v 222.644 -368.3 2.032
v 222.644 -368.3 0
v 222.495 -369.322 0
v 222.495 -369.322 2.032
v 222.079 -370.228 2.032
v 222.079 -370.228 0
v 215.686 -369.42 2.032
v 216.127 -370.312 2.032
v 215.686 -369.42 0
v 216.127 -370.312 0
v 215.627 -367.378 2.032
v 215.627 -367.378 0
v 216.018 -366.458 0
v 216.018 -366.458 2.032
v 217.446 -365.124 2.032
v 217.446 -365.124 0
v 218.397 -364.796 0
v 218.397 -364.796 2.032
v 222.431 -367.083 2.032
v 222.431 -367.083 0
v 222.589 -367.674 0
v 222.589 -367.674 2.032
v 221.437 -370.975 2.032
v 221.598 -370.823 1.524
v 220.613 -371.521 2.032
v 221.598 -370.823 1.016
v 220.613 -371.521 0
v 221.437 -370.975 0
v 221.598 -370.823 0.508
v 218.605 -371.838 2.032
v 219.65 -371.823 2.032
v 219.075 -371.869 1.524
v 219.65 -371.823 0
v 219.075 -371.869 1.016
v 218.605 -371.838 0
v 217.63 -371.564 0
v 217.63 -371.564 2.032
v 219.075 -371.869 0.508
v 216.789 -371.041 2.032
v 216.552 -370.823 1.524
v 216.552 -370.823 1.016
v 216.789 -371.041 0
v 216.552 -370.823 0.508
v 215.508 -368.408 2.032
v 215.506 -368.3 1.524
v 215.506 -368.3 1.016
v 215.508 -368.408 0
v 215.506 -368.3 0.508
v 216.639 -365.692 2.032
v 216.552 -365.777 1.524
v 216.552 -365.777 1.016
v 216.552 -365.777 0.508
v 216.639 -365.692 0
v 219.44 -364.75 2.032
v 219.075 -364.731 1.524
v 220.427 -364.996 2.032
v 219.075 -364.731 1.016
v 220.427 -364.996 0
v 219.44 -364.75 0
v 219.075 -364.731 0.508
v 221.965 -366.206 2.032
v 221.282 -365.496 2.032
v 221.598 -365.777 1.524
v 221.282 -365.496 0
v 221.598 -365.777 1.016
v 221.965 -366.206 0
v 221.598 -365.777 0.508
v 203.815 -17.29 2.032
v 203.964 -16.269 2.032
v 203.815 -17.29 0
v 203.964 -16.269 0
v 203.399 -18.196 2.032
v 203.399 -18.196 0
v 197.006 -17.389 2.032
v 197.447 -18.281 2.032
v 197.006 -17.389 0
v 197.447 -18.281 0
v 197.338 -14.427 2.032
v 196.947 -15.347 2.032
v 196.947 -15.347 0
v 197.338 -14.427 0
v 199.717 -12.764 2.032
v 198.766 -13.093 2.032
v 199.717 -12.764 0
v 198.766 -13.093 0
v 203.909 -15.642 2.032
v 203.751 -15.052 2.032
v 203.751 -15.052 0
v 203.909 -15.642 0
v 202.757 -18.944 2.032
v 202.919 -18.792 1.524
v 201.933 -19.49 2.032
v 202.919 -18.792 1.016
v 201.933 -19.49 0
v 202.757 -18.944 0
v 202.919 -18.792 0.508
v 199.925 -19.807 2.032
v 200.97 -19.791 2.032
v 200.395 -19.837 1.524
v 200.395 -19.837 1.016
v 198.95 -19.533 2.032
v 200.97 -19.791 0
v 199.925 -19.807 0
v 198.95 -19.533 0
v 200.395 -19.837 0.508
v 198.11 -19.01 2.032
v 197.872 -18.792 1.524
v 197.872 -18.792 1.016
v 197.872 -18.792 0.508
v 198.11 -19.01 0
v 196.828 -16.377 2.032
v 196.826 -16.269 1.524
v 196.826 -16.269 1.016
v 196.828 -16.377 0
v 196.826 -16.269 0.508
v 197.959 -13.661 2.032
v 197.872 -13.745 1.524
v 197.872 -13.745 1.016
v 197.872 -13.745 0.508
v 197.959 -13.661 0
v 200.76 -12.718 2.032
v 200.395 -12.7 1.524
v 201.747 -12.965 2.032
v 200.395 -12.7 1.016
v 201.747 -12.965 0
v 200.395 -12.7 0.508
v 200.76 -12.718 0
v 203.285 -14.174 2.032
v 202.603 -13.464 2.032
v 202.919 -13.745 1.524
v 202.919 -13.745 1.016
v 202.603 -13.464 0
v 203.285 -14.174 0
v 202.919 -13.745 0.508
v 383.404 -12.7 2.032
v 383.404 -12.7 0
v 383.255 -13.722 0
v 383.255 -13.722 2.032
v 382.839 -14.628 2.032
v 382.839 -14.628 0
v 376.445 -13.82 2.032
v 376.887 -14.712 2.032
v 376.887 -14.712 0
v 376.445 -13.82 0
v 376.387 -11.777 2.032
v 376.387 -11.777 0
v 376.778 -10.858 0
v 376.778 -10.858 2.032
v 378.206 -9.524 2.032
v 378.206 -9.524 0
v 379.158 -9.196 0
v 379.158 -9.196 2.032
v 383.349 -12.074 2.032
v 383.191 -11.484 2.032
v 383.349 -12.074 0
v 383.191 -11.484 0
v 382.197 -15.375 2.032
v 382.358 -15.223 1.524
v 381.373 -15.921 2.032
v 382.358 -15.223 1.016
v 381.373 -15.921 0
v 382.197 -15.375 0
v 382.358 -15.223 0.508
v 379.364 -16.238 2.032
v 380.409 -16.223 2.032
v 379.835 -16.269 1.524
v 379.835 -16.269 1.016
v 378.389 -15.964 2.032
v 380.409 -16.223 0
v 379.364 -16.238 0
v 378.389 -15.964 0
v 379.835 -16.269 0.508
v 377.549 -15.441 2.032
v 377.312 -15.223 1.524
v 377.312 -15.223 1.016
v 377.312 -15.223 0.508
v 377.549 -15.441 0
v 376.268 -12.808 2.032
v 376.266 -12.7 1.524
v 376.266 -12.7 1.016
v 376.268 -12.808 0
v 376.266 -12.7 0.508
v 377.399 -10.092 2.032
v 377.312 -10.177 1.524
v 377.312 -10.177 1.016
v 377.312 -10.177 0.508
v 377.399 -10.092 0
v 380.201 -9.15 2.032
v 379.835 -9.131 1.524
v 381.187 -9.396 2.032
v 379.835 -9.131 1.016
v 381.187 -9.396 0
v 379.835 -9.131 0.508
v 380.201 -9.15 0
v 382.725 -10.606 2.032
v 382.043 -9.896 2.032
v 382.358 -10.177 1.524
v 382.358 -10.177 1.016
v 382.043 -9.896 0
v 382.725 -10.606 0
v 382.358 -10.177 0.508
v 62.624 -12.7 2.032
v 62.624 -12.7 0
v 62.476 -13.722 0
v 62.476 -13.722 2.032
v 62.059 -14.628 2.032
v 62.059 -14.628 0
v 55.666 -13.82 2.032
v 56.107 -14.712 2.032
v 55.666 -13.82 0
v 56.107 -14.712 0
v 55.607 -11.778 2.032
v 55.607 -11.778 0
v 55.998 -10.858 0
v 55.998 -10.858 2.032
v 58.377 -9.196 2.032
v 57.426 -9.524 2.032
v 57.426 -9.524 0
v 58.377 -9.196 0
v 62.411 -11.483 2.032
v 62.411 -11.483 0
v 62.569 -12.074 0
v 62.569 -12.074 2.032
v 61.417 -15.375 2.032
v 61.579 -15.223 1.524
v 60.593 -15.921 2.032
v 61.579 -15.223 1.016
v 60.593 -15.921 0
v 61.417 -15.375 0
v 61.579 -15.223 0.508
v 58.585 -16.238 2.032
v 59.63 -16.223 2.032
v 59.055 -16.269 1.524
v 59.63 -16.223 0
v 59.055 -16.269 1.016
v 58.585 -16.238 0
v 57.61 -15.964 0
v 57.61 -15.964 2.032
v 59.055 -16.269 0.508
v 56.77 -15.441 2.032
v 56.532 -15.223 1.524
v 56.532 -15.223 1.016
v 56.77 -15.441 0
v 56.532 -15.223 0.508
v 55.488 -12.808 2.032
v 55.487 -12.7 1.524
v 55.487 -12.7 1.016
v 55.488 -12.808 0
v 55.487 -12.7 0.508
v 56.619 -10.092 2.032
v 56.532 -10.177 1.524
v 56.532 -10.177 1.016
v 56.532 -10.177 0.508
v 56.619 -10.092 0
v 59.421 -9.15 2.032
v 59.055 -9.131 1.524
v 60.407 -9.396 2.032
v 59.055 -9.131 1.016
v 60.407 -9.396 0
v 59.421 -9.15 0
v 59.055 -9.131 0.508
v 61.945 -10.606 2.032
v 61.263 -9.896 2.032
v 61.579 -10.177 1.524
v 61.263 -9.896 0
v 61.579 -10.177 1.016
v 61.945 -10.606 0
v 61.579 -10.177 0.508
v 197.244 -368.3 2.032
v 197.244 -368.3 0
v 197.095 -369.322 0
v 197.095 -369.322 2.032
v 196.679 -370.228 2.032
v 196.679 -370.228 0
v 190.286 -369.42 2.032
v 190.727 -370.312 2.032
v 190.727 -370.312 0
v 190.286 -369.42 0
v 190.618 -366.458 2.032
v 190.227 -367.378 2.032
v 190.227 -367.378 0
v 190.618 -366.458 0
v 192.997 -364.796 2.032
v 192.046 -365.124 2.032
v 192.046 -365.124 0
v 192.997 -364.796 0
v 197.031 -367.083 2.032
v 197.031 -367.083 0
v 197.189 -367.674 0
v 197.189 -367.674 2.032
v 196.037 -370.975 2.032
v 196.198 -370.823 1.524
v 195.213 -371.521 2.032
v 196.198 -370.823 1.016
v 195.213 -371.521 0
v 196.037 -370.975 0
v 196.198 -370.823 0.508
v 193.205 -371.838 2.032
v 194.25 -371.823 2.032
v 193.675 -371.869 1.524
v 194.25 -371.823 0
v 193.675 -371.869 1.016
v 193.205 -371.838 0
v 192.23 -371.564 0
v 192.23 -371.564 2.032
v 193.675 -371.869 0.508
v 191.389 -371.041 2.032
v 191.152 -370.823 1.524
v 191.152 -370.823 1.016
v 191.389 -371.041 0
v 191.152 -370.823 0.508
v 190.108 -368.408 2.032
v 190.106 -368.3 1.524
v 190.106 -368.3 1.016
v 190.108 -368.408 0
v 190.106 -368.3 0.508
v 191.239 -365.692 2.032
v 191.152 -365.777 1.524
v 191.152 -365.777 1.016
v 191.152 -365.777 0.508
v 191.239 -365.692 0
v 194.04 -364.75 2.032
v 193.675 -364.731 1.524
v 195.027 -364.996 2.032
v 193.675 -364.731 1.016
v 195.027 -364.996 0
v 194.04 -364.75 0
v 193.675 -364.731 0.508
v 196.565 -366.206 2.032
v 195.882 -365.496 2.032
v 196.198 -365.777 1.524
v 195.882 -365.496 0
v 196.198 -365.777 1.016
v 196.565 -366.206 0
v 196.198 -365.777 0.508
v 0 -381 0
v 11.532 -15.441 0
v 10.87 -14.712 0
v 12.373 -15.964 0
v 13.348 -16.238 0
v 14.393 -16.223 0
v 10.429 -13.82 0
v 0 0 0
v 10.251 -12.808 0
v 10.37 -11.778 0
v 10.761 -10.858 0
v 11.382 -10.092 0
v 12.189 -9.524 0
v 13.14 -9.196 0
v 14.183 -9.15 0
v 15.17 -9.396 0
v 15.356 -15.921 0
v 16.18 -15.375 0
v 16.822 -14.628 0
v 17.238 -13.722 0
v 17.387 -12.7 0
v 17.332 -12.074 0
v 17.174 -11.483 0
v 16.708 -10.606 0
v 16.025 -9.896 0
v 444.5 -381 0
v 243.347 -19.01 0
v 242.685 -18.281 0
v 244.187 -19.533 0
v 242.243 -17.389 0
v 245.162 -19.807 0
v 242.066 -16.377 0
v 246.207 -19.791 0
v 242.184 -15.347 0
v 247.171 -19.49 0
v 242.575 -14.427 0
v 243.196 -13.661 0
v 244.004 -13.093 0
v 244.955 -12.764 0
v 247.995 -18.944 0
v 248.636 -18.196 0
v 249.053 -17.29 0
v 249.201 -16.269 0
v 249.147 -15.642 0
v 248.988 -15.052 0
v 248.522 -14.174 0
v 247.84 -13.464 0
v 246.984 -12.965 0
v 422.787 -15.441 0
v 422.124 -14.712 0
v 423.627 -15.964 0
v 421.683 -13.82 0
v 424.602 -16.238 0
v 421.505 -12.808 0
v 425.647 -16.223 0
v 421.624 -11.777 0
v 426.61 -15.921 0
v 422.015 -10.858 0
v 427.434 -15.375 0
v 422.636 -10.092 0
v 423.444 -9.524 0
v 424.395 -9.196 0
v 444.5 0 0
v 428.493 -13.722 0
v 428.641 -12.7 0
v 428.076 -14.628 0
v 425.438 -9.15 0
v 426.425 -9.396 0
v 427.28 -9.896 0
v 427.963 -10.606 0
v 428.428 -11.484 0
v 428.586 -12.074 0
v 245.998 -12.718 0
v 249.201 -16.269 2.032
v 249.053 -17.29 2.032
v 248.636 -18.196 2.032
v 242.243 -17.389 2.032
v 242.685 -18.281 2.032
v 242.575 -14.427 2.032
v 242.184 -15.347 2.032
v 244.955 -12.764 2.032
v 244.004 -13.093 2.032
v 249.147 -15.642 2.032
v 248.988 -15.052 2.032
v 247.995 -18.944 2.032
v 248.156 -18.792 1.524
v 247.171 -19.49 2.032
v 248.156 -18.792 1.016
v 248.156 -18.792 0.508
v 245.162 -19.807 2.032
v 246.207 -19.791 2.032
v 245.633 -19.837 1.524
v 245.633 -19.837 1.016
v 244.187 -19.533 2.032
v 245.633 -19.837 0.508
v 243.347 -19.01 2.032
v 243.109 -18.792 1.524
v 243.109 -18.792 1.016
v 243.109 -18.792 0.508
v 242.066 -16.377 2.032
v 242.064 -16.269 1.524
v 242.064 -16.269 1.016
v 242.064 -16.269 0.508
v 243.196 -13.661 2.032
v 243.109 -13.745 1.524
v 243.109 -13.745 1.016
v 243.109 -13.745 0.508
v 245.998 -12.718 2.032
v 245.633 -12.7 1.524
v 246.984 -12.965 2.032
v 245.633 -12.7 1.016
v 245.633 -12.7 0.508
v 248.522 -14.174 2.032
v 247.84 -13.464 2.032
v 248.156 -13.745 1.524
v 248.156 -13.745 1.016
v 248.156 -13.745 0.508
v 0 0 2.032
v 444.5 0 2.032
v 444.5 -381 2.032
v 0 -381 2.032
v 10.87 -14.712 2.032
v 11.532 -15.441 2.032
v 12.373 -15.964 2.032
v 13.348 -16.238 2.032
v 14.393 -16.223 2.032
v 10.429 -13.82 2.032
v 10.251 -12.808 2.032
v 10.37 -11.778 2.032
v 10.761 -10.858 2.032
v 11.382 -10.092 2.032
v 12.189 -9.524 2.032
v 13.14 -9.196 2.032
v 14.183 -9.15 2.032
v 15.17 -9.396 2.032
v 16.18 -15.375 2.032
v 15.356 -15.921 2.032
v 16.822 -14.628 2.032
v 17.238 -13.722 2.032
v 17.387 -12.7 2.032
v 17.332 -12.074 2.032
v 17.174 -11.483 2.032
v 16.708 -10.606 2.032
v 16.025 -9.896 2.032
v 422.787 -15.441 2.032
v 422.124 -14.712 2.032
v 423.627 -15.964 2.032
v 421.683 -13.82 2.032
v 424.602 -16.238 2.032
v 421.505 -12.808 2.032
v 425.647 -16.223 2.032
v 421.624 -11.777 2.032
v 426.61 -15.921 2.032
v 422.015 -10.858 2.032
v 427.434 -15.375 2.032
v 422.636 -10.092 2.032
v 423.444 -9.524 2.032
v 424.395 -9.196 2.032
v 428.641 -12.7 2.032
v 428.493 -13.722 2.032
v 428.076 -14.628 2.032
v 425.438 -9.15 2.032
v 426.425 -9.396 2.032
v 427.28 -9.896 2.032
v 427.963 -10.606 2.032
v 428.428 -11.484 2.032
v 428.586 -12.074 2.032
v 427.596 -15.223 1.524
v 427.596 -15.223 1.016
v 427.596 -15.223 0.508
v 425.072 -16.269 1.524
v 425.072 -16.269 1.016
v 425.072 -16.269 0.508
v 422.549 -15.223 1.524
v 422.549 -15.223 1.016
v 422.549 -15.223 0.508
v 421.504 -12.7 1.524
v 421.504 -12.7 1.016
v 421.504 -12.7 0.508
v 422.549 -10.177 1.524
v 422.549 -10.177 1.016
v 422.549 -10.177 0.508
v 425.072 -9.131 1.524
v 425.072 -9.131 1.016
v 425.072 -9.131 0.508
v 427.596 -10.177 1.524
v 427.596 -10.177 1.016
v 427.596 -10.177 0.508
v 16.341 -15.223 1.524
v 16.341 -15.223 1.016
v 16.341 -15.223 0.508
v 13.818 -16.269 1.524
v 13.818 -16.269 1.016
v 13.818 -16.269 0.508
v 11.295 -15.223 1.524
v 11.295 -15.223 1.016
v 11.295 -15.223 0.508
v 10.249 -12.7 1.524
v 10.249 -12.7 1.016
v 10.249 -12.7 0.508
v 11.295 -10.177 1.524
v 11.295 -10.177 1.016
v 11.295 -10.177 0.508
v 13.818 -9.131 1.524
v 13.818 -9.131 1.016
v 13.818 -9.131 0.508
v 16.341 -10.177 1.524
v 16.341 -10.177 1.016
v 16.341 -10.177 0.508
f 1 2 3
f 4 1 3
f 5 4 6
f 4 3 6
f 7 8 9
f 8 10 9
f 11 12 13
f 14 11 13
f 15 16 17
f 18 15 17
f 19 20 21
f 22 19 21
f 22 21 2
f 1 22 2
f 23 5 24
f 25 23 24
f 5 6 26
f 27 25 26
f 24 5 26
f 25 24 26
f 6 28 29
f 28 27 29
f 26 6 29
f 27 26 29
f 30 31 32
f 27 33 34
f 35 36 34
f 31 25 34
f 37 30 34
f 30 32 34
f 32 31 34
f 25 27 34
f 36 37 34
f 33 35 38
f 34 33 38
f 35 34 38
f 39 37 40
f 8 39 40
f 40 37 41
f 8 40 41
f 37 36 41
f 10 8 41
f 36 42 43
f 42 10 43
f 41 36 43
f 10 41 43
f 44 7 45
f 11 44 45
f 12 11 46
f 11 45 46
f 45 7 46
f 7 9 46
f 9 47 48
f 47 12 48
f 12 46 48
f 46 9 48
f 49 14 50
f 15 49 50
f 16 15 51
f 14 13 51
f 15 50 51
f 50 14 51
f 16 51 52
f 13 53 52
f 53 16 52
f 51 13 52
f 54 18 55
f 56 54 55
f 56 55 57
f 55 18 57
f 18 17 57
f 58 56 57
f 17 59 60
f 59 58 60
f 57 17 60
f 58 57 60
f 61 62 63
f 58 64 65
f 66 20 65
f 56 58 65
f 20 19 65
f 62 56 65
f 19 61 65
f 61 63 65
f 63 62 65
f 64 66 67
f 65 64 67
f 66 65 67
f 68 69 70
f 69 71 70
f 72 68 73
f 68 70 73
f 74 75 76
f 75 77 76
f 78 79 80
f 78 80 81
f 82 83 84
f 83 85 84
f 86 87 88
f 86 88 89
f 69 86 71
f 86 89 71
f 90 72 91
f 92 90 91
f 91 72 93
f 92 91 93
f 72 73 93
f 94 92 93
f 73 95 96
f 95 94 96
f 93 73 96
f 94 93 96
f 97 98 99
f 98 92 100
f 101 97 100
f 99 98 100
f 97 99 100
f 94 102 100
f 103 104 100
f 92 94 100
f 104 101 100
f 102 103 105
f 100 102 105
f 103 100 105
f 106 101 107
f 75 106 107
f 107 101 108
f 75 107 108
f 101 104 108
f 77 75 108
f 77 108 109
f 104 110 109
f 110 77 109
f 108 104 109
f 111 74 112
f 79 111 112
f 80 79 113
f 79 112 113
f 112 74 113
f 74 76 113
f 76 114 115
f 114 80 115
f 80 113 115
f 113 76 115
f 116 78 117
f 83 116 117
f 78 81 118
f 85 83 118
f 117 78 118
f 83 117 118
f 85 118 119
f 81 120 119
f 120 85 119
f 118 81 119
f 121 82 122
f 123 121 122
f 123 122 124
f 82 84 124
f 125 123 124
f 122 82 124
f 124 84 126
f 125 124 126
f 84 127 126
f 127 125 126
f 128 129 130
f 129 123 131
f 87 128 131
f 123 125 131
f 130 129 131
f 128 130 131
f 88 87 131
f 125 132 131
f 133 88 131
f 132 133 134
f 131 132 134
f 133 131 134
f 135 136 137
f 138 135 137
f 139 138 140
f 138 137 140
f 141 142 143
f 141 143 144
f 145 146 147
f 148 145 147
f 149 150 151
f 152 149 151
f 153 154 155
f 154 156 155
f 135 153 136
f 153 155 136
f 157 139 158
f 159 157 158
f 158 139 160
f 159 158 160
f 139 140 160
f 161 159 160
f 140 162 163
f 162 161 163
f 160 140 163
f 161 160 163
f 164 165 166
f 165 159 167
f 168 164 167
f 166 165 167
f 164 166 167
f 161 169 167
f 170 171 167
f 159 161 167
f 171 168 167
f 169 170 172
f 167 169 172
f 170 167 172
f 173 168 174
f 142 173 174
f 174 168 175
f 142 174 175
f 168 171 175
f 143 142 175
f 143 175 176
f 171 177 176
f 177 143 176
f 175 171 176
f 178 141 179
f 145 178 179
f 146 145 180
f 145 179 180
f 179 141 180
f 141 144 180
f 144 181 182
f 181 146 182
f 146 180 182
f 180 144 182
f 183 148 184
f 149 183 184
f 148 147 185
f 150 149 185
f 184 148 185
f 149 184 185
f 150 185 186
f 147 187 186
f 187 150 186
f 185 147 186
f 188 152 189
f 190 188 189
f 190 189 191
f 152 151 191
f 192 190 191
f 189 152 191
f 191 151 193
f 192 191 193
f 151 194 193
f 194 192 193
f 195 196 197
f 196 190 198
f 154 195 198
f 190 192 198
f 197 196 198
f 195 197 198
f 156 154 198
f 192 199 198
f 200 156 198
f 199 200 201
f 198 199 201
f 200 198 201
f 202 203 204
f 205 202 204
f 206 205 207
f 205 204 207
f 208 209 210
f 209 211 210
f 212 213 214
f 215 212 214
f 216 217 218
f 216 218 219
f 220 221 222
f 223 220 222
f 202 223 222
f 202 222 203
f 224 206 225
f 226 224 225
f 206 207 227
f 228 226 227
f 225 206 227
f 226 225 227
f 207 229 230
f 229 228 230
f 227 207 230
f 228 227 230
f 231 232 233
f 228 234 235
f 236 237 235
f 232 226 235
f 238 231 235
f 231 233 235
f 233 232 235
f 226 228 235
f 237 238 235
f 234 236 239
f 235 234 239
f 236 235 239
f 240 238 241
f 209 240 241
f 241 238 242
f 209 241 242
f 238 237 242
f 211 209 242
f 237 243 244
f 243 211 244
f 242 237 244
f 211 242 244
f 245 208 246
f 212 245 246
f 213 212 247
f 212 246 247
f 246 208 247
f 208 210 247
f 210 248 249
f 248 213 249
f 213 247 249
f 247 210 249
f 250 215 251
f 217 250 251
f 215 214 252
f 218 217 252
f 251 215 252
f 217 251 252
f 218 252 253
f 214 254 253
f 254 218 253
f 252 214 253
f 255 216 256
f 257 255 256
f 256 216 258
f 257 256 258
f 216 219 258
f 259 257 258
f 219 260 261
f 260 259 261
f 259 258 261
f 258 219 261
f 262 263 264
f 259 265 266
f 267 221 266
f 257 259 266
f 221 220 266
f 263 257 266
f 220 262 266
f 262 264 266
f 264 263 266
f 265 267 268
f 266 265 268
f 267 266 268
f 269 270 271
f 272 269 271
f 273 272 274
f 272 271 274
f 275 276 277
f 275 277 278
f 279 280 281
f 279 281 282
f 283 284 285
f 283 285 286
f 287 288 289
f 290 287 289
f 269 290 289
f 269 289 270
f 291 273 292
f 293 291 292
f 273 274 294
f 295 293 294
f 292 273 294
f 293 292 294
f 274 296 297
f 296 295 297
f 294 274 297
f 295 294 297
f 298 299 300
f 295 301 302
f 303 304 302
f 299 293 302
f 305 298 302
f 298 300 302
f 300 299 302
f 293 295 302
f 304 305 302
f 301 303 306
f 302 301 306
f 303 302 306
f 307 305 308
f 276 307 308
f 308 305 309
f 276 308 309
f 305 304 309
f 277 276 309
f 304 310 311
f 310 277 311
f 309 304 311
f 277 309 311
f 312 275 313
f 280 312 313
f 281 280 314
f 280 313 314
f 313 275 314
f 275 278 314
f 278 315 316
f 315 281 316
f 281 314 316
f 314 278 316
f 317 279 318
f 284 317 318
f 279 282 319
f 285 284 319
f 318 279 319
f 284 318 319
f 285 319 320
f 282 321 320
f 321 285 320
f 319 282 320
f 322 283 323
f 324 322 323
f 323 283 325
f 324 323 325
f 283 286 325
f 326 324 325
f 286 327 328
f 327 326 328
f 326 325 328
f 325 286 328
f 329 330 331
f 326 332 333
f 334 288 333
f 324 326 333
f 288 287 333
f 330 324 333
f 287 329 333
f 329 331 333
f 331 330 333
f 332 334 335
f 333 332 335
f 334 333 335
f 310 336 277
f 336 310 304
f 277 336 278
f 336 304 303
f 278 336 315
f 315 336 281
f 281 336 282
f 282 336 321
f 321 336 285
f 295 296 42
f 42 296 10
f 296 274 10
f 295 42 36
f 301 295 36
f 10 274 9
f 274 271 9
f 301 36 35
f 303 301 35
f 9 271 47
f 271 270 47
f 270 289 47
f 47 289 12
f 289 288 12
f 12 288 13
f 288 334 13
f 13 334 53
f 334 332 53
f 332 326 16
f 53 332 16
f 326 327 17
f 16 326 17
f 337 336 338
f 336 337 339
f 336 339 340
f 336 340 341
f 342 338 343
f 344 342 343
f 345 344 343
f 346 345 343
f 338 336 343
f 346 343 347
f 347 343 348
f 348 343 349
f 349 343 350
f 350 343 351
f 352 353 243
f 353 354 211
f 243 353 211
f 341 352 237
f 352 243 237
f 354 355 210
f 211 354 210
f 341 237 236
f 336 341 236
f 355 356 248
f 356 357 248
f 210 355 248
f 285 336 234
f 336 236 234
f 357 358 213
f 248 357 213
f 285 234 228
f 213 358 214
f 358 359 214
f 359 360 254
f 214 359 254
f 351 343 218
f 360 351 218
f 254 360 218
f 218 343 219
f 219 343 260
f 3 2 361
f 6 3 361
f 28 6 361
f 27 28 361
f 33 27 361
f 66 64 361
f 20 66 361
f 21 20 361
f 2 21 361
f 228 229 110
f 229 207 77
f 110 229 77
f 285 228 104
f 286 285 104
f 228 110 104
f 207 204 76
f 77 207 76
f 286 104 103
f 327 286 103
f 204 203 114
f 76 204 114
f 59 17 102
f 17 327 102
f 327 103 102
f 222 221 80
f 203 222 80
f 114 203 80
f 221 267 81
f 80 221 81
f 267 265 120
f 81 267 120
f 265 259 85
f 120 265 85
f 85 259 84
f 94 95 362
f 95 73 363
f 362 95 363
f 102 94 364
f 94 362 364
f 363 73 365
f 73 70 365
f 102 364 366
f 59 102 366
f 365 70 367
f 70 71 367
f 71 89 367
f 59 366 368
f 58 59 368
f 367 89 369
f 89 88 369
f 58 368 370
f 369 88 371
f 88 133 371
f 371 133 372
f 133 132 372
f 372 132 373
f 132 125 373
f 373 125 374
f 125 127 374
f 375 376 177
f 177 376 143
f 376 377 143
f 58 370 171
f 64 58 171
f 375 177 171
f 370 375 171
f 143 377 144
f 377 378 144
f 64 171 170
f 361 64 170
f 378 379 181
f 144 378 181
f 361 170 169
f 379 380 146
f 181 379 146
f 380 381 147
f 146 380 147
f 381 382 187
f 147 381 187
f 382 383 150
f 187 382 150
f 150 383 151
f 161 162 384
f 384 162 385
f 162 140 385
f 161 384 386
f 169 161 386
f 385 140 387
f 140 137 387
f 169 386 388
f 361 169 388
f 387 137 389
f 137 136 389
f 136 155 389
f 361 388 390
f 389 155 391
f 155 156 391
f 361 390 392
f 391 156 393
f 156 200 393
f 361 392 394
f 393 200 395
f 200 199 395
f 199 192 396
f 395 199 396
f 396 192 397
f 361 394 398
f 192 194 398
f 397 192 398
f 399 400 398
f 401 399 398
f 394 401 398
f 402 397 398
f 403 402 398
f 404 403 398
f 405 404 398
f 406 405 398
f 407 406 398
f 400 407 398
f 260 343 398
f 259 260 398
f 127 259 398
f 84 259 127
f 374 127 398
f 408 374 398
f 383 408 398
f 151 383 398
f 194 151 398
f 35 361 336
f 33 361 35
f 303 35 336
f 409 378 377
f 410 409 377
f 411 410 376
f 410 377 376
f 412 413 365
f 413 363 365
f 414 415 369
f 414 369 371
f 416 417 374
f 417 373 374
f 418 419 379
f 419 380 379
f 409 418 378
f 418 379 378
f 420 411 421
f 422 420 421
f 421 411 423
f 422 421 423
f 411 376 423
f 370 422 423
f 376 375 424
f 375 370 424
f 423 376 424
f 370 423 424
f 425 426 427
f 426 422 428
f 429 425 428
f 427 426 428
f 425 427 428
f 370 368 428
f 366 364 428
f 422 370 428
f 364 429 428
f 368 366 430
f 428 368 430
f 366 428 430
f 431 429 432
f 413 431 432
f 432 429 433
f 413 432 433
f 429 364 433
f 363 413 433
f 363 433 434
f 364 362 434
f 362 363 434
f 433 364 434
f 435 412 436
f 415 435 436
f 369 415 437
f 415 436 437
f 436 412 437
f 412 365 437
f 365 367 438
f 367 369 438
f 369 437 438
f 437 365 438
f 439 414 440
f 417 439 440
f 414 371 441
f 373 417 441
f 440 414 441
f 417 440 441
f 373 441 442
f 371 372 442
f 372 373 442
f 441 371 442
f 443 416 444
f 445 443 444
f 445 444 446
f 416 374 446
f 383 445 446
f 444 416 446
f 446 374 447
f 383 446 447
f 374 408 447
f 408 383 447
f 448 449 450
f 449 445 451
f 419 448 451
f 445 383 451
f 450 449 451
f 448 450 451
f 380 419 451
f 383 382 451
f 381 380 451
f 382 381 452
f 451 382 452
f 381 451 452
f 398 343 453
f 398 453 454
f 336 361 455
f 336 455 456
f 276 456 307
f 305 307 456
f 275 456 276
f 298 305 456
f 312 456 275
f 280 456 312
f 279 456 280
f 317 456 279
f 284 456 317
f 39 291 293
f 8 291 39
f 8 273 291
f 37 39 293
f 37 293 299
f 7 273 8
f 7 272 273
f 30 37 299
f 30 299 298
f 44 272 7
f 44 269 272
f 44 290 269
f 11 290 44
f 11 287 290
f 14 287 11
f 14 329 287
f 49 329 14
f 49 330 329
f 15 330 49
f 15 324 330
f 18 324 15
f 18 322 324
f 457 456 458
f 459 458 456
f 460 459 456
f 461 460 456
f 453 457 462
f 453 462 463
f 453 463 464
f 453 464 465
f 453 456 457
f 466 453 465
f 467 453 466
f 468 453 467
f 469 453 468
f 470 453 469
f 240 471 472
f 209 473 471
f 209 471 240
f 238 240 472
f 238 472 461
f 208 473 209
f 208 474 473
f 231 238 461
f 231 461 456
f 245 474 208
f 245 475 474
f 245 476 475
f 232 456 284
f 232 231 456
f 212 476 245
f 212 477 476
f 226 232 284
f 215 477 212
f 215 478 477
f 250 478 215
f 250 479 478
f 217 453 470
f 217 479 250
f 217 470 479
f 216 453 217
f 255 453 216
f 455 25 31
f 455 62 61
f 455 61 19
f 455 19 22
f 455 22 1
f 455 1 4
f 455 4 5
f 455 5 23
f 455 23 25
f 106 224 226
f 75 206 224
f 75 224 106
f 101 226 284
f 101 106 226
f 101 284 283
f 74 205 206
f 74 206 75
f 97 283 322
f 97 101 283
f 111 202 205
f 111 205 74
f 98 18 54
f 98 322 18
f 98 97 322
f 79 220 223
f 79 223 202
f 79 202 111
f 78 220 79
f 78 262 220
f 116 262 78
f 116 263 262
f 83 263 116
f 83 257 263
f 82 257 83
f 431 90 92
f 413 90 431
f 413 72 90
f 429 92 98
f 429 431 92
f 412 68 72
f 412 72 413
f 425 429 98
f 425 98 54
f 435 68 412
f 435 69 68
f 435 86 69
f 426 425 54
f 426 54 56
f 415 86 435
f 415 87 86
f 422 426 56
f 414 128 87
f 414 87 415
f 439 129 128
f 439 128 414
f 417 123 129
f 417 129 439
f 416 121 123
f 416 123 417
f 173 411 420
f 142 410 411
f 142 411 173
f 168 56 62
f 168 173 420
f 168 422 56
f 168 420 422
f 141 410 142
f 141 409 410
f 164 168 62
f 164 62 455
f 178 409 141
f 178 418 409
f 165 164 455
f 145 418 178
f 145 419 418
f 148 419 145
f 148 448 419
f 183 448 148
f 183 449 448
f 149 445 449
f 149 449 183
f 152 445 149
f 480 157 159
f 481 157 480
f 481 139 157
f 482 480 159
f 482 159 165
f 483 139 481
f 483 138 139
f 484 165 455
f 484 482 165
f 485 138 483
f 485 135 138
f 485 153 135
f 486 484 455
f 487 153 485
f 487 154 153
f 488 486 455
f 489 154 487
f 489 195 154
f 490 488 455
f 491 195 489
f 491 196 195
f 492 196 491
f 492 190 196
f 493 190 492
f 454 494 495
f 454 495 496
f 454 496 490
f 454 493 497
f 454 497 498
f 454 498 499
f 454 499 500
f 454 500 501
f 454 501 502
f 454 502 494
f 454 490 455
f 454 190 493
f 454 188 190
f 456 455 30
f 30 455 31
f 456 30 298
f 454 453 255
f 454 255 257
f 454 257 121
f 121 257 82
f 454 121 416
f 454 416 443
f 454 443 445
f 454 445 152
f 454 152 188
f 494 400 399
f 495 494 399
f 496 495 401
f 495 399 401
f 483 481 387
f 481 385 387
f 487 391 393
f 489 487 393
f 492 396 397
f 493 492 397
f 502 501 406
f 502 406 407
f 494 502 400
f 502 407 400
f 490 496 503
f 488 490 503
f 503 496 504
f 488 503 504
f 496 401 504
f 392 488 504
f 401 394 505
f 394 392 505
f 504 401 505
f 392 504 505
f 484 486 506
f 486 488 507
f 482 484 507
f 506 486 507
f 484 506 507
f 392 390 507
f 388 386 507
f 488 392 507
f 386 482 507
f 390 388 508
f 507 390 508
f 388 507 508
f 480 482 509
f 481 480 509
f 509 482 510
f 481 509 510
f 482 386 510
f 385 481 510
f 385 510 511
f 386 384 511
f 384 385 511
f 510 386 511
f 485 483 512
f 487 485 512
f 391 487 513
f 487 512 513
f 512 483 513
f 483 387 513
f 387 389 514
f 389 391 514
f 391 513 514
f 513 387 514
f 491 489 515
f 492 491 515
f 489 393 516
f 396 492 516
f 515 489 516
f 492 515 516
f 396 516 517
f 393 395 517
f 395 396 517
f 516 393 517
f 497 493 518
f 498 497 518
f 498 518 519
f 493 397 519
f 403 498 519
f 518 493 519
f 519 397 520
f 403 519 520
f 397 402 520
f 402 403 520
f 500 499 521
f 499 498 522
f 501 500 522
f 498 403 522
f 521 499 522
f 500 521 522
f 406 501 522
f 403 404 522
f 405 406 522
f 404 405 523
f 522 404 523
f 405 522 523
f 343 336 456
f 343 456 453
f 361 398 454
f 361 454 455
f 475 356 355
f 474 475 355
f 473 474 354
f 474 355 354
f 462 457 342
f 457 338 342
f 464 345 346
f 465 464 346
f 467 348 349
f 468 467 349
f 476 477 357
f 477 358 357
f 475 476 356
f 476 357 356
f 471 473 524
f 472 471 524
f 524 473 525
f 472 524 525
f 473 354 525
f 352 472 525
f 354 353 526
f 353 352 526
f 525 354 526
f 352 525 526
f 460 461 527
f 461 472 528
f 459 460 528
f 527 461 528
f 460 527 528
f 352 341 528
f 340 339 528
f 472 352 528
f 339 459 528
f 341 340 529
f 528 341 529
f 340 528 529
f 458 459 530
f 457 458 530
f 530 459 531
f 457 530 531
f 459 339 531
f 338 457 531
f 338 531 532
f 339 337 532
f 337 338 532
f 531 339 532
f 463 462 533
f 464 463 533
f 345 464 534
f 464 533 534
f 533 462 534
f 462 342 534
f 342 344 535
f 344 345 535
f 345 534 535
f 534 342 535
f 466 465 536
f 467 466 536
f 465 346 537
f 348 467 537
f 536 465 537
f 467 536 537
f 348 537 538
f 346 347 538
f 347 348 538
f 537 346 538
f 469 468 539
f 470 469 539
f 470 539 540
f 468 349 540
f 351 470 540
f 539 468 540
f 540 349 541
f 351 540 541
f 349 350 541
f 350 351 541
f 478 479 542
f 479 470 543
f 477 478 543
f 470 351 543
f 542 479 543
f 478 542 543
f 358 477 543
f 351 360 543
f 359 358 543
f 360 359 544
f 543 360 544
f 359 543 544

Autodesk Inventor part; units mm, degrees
ref_plane "YZ Plane" through (0, 0, 0) normal (1, 0, 0) x (0, 1, 0)
ref_plane "XZ Plane" through (0, 0, 0) normal (0, 1, 0) x (-1, 0, 0)
ref_plane "XY Plane" through (0, 0, 0) normal (0, 0, 1) x (1, 0, 0)
sketch "Sketch1" plane through (0, 0, 0) normal (0, 0, 1) x (1, 0, 0)
  line L0 (0, -381) -> (0, 0)
  line L1 (0, 0) -> (444.5, 0)
  line L2 (444.5, 0) -> (444.5, -381)
  line L3 (444.5, -381) -> (0, -381)
  spline S0 degree 3 poles (17.3867, -12.7) (17.3867, -14.6709) (15.7889, -16.2687) (13.818, -16.2687) (11.847, -16.2687) (10.2493, -14.6709) (10.2493, -12.7) (10.2493, -10.7291) (11.847, -9.1313) (13.818, -9.1313) (15.7889, -9.1313) (17.3867, -10.7291) (17.3867, -12.7) knots 0 0 0 0 1 1 1 2 2 2 3 3 3 4 4 4 4
  line L4 (17.3867, -12.7) -> (17.3867, -14.6709) construction
  line L5 (17.3867, -14.6709) -> (15.7889, -16.2687) construction
  line L6 (15.7889, -16.2687) -> (13.818, -16.2687) construction
  line L7 (13.818, -16.2687) -> (11.847, -16.2687) construction
  line L8 (11.847, -16.2687) -> (10.2493, -14.6709) construction
  line L9 (10.2493, -14.6709) -> (10.2493, -12.7) construction
  line L10 (10.2493, -12.7) -> (10.2493, -10.7291) construction
  line L11 (10.2493, -10.7291) -> (11.847, -9.1313) construction
  line L12 (11.847, -9.1313) -> (13.818, -9.1313) construction
  line L13 (13.818, -9.1313) -> (15.7889, -9.1313) construction
  line L14 (15.7889, -9.1313) -> (17.3867, -10.7291) construction
  line L15 (17.3867, -10.7291) -> (17.3867, -12.7) construction
  spline S1 degree 3 poles (62.6241, -12.7) (62.6241, -14.6709) (61.0263, -16.2687) (59.0554, -16.2687) (57.0844, -16.2687) (55.4867, -14.6709) (55.4867, -12.7) (55.4867, -10.7291) (57.0844, -9.1313) (59.0554, -9.1313) (61.0263, -9.1313) (62.6241, -10.7291) (62.6241, -12.7) knots 0 0 0 0 1 1 1 2 2 2 3 3 3 4 4 4 4
  line L16 (62.6241, -12.7) -> (62.6241, -14.6709) construction
  line L17 (62.6241, -14.6709) -> (61.0263, -16.2687) construction
  line L18 (61.0263, -16.2687) -> (59.0554, -16.2687) construction
  line L19 (59.0554, -16.2687) -> (57.0844, -16.2687) construction
  line L20 (57.0844, -16.2687) -> (55.4867, -14.6709) construction
  line L21 (55.4867, -14.6709) -> (55.4867, -12.7) construction
  line L22 (55.4867, -12.7) -> (55.4867, -10.7291) construction
  line L23 (55.4867, -10.7291) -> (57.0844, -9.1313) construction
  line L24 (57.0844, -9.1313) -> (59.0554, -9.1313) construction
  line L25 (59.0554, -9.1313) -> (61.0263, -9.1313) construction
  line L26 (61.0263, -9.1313) -> (62.6241, -10.7291) construction
  line L27 (62.6241, -10.7291) -> (62.6241, -12.7) construction
  spline S2 degree 3 poles (383.4037, -12.7) (383.4037, -14.6709) (381.806, -16.2687) (379.835, -16.2687) (377.8641, -16.2687) (376.2663, -14.6709) (376.2663, -12.7) (376.2663, -10.7291) (377.8641, -9.1313) (379.835, -9.1313) (381.806, -9.1313) (383.4037, -10.7291) (383.4037, -12.7) knots 0 0 0 0 1 1 1 2 2 2 3 3 3 4 4 4 4
  line L28 (383.4037, -12.7) -> (383.4037, -14.6709) construction
  line L29 (383.4037, -14.6709) -> (381.806, -16.2687) construction
  line L30 (381.806, -16.2687) -> (379.835, -16.2687) construction
  line L31 (379.835, -16.2687) -> (377.8641, -16.2687) construction
  line L32 (377.8641, -16.2687) -> (376.2663, -14.6709) construction
  line L33 (376.2663, -14.6709) -> (376.2663, -12.7) construction
  line L34 (376.2663, -12.7) -> (376.2663, -10.7291) construction
  line L35 (376.2663, -10.7291) -> (377.8641, -9.1313) construction
  line L36 (377.8641, -9.1313) -> (379.835, -9.1313) construction
  line L37 (379.835, -9.1313) -> (381.806, -9.1313) construction
  line L38 (381.806, -9.1313) -> (383.4037, -10.7291) construction
  line L39 (383.4037, -10.7291) -> (383.4037, -12.7) construction
  spline S3 degree 3 poles (428.6411, -12.7) (428.6411, -14.6709) (427.0434, -16.2687) (425.0724, -16.2687) (423.1015, -16.2687) (421.5037, -14.6709) (421.5037, -12.7) (421.5037, -10.7291) (423.1015, -9.1313) (425.0724, -9.1313) (427.0434, -9.1313) (428.6411, -10.7291) (428.6411, -12.7) knots 0 0 0 0 1 1 1 2 2 2 3 3 3 4 4 4 4
  line L40 (428.6411, -12.7) -> (428.6411, -14.6709) construction
  line L41 (428.6411, -14.6709) -> (427.0434, -16.2687) construction
  line L42 (427.0434, -16.2687) -> (425.0724, -16.2687) construction
  line L43 (425.0724, -16.2687) -> (423.1015, -16.2687) construction
  line L44 (423.1015, -16.2687) -> (421.5037, -14.6709) construction
  line L45 (421.5037, -14.6709) -> (421.5037, -12.7) construction
  line L46 (421.5037, -12.7) -> (421.5037, -10.7291) construction
  line L47 (421.5037, -10.7291) -> (423.1015, -9.1313) construction
  line L48 (423.1015, -9.1313) -> (425.0724, -9.1313) construction
  line L49 (425.0724, -9.1313) -> (427.0434, -9.1313) construction
  line L50 (427.0434, -9.1313) -> (428.6411, -10.7291) construction
  line L51 (428.6411, -10.7291) -> (428.6411, -12.7) construction
  spline S4 degree 3 poles (203.9639, -16.2687) (203.9639, -18.2396) (202.3661, -19.8374) (200.3952, -19.8374) (198.4243, -19.8374) (196.8265, -18.2396) (196.8265, -16.2687) (196.8265, -14.2978) (198.4243, -12.7) (200.3952, -12.7) (202.3661, -12.7) (203.9639, -14.2978) (203.9639, -16.2687) knots 0 0 0 0 1 1 1 2 2 2 3 3 3 4 4 4 4
  line L52 (203.9639, -16.2687) -> (203.9639, -18.2396) construction
  line L53 (203.9639, -18.2396) -> (202.3661, -19.8374) construction
  line L54 (202.3661, -19.8374) -> (200.3952, -19.8374) construction
  line L55 (200.3952, -19.8374) -> (198.4243, -19.8374) construction
  line L56 (198.4243, -19.8374) -> (196.8265, -18.2396) construction
  line L57 (196.8265, -18.2396) -> (196.8265, -16.2687) construction
  line L58 (196.8265, -16.2687) -> (196.8265, -14.2978) construction
  line L59 (196.8265, -14.2978) -> (198.4243, -12.7) construction
  line L60 (198.4243, -12.7) -> (200.3952, -12.7) construction
  line L61 (200.3952, -12.7) -> (202.3661, -12.7) construction
  line L62 (202.3661, -12.7) -> (203.9639, -14.2978) construction
  line L63 (203.9639, -14.2978) -> (203.9639, -16.2687) construction
  spline S5 degree 3 poles (249.2013, -16.2687) (249.2013, -18.2396) (247.6035, -19.8374) (245.6326, -19.8374) (243.6617, -19.8374) (242.0639, -18.2396) (242.0639, -16.2687) (242.0639, -14.2978) (243.6617, -12.7) (245.6326, -12.7) (247.6035, -12.7) (249.2013, -14.2978) (249.2013, -16.2687) knots 0 0 0 0 1 1 1 2 2 2 3 3 3 4 4 4 4
  line L64 (249.2013, -16.2687) -> (249.2013, -18.2396) construction
  line L65 (249.2013, -18.2396) -> (247.6035, -19.8374) construction
  line L66 (247.6035, -19.8374) -> (245.6326, -19.8374) construction
  line L67 (245.6326, -19.8374) -> (243.6617, -19.8374) construction
  line L68 (243.6617, -19.8374) -> (242.0639, -18.2396) construction
  line L69 (242.0639, -18.2396) -> (242.0639, -16.2687) construction
  line L70 (242.0639, -16.2687) -> (242.0639, -14.2978) construction
  line L71 (242.0639, -14.2978) -> (243.6617, -12.7) construction
  line L72 (243.6617, -12.7) -> (245.6326, -12.7) construction
  line L73 (245.6326, -12.7) -> (247.6035, -12.7) construction
  line L74 (247.6035, -12.7) -> (249.2013, -14.2978) construction
  line L75 (249.2013, -14.2978) -> (249.2013, -16.2687) construction
  spline S6 degree 3 poles (197.2437, -368.3) (197.2437, -370.2709) (195.6459, -371.8687) (193.675, -371.8687) (191.7041, -371.8687) (190.1063, -370.2709) (190.1063, -368.3) (190.1063, -366.3291) (191.7041, -364.7313) (193.675, -364.7313) (195.6459, -364.7313) (197.2437, -366.3291) (197.2437, -368.3) knots 0 0 0 0 1 1 1 2 2 2 3 3 3 4 4 4 4
  line L76 (197.2437, -368.3) -> (197.2437, -370.2709) construction
  line L77 (197.2437, -370.2709) -> (195.6459, -371.8687) construction
  line L78 (195.6459, -371.8687) -> (193.675, -371.8687) construction
  line L79 (193.675, -371.8687) -> (191.7041, -371.8687) construction
  line L80 (191.7041, -371.8687) -> (190.1063, -370.2709) construction
  line L81 (190.1063, -370.2709) -> (190.1063, -368.3) construction
  line L82 (190.1063, -368.3) -> (190.1063, -366.3291) construction
  line L83 (190.1063, -366.3291) -> (191.7041, -364.7313) construction
  line L84 (191.7041, -364.7313) -> (193.675, -364.7313) construction
  line L85 (193.675, -364.7313) -> (195.6459, -364.7313) construction
  line L86 (195.6459, -364.7313) -> (197.2437, -366.3291) construction
  line L87 (197.2437, -366.3291) -> (197.2437, -368.3) construction
  spline S7 degree 3 poles (222.6437, -368.3) (222.6437, -370.2709) (221.0459, -371.8687) (219.075, -371.8687) (217.1041, -371.8687) (215.5063, -370.2709) (215.5063, -368.3) (215.5063, -366.3291) (217.1041, -364.7313) (219.075, -364.7313) (221.0459, -364.7313) (222.6437, -366.3291) (222.6437, -368.3) knots 0 0 0 0 1 1 1 2 2 2 3 3 3 4 4 4 4
  line L88 (222.6437, -368.3) -> (222.6437, -370.2709) construction
  line L89 (222.6437, -370.2709) -> (221.0459, -371.8687) construction
  line L90 (221.0459, -371.8687) -> (219.075, -371.8687) construction
  line L91 (219.075, -371.8687) -> (217.1041, -371.8687) construction
  line L92 (217.1041, -371.8687) -> (215.5063, -370.2709) construction
  line L93 (215.5063, -370.2709) -> (215.5063, -368.3) construction
  line L94 (215.5063, -368.3) -> (215.5063, -366.3291) construction
  line L95 (215.5063, -366.3291) -> (217.1041, -364.7313) construction
  line L96 (217.1041, -364.7313) -> (219.075, -364.7313) construction
  line L97 (219.075, -364.7313) -> (221.0459, -364.7313) construction
  line L98 (221.0459, -364.7313) -> (222.6437, -366.3291) construction
  line L99 (222.6437, -366.3291) -> (222.6437, -368.3) construction
extrude "Extrusion1" add sketch "Sketch1" along normal blind 2.032
properties part number "side shield 2"
